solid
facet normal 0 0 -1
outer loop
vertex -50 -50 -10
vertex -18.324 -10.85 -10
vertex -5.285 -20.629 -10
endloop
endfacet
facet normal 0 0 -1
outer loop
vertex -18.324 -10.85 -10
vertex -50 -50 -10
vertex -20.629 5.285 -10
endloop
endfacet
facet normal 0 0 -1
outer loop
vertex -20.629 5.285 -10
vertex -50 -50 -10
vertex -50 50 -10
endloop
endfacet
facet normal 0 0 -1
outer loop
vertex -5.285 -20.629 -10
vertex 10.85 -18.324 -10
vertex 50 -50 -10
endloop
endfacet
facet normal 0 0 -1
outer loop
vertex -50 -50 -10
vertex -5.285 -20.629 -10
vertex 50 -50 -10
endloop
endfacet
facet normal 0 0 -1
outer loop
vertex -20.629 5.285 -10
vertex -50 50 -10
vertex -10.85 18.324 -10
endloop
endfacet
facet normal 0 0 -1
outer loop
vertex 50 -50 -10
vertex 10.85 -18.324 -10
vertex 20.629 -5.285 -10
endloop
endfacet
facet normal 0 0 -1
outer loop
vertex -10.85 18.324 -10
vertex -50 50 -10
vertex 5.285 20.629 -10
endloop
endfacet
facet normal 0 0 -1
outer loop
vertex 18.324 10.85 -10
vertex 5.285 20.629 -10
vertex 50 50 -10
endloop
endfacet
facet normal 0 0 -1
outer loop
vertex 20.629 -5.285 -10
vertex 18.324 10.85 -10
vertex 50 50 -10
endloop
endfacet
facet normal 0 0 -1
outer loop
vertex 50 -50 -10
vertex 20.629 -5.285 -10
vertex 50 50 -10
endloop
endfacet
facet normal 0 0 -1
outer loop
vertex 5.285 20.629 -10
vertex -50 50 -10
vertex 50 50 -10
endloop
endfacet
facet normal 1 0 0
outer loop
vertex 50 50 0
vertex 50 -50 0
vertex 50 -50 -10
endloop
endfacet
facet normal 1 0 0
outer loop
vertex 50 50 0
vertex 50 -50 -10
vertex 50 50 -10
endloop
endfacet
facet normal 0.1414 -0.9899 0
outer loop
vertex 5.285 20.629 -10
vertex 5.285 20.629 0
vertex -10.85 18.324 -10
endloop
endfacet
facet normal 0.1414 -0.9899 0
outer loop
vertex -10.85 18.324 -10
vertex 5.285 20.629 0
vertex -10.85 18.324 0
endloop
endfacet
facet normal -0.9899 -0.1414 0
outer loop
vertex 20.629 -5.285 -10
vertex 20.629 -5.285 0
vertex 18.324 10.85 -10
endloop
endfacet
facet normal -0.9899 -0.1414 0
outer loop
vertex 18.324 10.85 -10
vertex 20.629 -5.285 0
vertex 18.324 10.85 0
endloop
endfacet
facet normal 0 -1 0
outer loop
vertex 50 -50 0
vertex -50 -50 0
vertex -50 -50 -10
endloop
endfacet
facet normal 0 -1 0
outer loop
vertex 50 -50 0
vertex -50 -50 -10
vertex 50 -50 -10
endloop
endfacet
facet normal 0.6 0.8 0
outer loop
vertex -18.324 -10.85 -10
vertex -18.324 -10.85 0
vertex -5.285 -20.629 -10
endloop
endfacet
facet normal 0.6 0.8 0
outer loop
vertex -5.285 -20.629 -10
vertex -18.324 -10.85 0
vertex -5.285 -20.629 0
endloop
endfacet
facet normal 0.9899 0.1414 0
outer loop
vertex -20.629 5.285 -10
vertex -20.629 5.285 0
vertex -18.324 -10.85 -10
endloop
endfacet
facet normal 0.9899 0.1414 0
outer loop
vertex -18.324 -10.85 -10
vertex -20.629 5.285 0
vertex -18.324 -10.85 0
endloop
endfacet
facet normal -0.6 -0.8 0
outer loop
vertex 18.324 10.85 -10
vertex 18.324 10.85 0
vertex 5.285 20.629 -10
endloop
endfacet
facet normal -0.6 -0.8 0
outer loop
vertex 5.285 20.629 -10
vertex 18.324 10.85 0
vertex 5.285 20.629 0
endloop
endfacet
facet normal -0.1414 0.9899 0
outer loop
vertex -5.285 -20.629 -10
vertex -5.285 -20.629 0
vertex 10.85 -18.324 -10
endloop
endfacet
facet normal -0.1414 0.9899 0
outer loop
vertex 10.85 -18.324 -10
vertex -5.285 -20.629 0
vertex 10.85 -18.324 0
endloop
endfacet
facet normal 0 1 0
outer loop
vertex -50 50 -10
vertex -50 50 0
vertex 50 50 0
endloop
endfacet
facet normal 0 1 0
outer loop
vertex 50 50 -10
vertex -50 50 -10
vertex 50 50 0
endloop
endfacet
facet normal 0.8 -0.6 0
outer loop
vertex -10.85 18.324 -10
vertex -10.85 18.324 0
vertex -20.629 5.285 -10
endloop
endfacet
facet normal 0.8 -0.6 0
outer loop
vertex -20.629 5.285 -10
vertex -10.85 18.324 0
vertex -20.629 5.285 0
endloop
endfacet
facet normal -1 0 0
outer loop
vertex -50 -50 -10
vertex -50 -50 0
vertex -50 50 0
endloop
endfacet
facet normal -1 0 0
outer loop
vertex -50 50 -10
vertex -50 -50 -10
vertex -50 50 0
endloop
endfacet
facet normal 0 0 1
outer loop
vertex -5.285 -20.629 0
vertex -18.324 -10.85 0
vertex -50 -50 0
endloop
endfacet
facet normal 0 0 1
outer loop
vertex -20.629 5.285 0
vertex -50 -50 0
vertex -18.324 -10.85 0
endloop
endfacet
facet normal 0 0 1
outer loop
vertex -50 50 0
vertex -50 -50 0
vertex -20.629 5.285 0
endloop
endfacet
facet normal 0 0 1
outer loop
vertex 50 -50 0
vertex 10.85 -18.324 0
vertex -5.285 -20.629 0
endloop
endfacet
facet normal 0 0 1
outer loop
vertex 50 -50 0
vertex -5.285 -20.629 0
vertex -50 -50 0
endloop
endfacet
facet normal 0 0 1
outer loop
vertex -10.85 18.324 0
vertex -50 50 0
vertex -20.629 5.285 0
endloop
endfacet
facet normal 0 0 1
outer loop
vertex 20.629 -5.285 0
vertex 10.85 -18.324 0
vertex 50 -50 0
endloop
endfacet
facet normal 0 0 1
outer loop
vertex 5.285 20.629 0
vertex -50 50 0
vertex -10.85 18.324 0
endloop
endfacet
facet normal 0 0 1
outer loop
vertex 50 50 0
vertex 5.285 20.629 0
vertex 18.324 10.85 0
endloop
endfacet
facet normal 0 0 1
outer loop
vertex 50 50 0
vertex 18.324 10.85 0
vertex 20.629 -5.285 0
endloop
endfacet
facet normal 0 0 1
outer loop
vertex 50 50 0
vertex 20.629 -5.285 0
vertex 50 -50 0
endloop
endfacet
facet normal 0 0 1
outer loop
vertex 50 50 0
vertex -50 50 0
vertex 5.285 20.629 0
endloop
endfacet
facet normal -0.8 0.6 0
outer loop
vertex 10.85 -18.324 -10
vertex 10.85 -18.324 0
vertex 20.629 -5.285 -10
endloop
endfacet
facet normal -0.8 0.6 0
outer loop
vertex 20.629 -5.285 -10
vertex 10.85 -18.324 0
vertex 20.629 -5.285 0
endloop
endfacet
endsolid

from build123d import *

# Parameters (mm, degrees)
F0_W     = 100
F0_H     = 100
F1_DEPTH = 10
F3_DEPTH = 39.624


# Not quite as in the source:
# - a feature names something its author has since deleted; it is built from what else it names


with BuildPart() as f1:
    # F0 (on Top) → F1 (new body)
    with BuildSketch(Plane.XY):
        Rectangle(F0_W, F0_H)
    extrude(amount=-F1_DEPTH)

    # F2 (on face) → F3 (cut)
    with BuildSketch(Plane.XY):
        Polygon((10.8499823283, -18.3243404083), (20.6293614436, -5.2851692833), (18.3243404083, 10.8499823283), (5.2851692833, 20.6293614436), (-10.8499823283, 18.3243404083), (-20.6293614436, 5.2851692833), (-18.3243404083, -10.8499823283), (-5.2851692833, -20.6293614436), align=None)
    extrude(amount=-F3_DEPTH, mode=Mode.SUBTRACT)


solid = f1.part
